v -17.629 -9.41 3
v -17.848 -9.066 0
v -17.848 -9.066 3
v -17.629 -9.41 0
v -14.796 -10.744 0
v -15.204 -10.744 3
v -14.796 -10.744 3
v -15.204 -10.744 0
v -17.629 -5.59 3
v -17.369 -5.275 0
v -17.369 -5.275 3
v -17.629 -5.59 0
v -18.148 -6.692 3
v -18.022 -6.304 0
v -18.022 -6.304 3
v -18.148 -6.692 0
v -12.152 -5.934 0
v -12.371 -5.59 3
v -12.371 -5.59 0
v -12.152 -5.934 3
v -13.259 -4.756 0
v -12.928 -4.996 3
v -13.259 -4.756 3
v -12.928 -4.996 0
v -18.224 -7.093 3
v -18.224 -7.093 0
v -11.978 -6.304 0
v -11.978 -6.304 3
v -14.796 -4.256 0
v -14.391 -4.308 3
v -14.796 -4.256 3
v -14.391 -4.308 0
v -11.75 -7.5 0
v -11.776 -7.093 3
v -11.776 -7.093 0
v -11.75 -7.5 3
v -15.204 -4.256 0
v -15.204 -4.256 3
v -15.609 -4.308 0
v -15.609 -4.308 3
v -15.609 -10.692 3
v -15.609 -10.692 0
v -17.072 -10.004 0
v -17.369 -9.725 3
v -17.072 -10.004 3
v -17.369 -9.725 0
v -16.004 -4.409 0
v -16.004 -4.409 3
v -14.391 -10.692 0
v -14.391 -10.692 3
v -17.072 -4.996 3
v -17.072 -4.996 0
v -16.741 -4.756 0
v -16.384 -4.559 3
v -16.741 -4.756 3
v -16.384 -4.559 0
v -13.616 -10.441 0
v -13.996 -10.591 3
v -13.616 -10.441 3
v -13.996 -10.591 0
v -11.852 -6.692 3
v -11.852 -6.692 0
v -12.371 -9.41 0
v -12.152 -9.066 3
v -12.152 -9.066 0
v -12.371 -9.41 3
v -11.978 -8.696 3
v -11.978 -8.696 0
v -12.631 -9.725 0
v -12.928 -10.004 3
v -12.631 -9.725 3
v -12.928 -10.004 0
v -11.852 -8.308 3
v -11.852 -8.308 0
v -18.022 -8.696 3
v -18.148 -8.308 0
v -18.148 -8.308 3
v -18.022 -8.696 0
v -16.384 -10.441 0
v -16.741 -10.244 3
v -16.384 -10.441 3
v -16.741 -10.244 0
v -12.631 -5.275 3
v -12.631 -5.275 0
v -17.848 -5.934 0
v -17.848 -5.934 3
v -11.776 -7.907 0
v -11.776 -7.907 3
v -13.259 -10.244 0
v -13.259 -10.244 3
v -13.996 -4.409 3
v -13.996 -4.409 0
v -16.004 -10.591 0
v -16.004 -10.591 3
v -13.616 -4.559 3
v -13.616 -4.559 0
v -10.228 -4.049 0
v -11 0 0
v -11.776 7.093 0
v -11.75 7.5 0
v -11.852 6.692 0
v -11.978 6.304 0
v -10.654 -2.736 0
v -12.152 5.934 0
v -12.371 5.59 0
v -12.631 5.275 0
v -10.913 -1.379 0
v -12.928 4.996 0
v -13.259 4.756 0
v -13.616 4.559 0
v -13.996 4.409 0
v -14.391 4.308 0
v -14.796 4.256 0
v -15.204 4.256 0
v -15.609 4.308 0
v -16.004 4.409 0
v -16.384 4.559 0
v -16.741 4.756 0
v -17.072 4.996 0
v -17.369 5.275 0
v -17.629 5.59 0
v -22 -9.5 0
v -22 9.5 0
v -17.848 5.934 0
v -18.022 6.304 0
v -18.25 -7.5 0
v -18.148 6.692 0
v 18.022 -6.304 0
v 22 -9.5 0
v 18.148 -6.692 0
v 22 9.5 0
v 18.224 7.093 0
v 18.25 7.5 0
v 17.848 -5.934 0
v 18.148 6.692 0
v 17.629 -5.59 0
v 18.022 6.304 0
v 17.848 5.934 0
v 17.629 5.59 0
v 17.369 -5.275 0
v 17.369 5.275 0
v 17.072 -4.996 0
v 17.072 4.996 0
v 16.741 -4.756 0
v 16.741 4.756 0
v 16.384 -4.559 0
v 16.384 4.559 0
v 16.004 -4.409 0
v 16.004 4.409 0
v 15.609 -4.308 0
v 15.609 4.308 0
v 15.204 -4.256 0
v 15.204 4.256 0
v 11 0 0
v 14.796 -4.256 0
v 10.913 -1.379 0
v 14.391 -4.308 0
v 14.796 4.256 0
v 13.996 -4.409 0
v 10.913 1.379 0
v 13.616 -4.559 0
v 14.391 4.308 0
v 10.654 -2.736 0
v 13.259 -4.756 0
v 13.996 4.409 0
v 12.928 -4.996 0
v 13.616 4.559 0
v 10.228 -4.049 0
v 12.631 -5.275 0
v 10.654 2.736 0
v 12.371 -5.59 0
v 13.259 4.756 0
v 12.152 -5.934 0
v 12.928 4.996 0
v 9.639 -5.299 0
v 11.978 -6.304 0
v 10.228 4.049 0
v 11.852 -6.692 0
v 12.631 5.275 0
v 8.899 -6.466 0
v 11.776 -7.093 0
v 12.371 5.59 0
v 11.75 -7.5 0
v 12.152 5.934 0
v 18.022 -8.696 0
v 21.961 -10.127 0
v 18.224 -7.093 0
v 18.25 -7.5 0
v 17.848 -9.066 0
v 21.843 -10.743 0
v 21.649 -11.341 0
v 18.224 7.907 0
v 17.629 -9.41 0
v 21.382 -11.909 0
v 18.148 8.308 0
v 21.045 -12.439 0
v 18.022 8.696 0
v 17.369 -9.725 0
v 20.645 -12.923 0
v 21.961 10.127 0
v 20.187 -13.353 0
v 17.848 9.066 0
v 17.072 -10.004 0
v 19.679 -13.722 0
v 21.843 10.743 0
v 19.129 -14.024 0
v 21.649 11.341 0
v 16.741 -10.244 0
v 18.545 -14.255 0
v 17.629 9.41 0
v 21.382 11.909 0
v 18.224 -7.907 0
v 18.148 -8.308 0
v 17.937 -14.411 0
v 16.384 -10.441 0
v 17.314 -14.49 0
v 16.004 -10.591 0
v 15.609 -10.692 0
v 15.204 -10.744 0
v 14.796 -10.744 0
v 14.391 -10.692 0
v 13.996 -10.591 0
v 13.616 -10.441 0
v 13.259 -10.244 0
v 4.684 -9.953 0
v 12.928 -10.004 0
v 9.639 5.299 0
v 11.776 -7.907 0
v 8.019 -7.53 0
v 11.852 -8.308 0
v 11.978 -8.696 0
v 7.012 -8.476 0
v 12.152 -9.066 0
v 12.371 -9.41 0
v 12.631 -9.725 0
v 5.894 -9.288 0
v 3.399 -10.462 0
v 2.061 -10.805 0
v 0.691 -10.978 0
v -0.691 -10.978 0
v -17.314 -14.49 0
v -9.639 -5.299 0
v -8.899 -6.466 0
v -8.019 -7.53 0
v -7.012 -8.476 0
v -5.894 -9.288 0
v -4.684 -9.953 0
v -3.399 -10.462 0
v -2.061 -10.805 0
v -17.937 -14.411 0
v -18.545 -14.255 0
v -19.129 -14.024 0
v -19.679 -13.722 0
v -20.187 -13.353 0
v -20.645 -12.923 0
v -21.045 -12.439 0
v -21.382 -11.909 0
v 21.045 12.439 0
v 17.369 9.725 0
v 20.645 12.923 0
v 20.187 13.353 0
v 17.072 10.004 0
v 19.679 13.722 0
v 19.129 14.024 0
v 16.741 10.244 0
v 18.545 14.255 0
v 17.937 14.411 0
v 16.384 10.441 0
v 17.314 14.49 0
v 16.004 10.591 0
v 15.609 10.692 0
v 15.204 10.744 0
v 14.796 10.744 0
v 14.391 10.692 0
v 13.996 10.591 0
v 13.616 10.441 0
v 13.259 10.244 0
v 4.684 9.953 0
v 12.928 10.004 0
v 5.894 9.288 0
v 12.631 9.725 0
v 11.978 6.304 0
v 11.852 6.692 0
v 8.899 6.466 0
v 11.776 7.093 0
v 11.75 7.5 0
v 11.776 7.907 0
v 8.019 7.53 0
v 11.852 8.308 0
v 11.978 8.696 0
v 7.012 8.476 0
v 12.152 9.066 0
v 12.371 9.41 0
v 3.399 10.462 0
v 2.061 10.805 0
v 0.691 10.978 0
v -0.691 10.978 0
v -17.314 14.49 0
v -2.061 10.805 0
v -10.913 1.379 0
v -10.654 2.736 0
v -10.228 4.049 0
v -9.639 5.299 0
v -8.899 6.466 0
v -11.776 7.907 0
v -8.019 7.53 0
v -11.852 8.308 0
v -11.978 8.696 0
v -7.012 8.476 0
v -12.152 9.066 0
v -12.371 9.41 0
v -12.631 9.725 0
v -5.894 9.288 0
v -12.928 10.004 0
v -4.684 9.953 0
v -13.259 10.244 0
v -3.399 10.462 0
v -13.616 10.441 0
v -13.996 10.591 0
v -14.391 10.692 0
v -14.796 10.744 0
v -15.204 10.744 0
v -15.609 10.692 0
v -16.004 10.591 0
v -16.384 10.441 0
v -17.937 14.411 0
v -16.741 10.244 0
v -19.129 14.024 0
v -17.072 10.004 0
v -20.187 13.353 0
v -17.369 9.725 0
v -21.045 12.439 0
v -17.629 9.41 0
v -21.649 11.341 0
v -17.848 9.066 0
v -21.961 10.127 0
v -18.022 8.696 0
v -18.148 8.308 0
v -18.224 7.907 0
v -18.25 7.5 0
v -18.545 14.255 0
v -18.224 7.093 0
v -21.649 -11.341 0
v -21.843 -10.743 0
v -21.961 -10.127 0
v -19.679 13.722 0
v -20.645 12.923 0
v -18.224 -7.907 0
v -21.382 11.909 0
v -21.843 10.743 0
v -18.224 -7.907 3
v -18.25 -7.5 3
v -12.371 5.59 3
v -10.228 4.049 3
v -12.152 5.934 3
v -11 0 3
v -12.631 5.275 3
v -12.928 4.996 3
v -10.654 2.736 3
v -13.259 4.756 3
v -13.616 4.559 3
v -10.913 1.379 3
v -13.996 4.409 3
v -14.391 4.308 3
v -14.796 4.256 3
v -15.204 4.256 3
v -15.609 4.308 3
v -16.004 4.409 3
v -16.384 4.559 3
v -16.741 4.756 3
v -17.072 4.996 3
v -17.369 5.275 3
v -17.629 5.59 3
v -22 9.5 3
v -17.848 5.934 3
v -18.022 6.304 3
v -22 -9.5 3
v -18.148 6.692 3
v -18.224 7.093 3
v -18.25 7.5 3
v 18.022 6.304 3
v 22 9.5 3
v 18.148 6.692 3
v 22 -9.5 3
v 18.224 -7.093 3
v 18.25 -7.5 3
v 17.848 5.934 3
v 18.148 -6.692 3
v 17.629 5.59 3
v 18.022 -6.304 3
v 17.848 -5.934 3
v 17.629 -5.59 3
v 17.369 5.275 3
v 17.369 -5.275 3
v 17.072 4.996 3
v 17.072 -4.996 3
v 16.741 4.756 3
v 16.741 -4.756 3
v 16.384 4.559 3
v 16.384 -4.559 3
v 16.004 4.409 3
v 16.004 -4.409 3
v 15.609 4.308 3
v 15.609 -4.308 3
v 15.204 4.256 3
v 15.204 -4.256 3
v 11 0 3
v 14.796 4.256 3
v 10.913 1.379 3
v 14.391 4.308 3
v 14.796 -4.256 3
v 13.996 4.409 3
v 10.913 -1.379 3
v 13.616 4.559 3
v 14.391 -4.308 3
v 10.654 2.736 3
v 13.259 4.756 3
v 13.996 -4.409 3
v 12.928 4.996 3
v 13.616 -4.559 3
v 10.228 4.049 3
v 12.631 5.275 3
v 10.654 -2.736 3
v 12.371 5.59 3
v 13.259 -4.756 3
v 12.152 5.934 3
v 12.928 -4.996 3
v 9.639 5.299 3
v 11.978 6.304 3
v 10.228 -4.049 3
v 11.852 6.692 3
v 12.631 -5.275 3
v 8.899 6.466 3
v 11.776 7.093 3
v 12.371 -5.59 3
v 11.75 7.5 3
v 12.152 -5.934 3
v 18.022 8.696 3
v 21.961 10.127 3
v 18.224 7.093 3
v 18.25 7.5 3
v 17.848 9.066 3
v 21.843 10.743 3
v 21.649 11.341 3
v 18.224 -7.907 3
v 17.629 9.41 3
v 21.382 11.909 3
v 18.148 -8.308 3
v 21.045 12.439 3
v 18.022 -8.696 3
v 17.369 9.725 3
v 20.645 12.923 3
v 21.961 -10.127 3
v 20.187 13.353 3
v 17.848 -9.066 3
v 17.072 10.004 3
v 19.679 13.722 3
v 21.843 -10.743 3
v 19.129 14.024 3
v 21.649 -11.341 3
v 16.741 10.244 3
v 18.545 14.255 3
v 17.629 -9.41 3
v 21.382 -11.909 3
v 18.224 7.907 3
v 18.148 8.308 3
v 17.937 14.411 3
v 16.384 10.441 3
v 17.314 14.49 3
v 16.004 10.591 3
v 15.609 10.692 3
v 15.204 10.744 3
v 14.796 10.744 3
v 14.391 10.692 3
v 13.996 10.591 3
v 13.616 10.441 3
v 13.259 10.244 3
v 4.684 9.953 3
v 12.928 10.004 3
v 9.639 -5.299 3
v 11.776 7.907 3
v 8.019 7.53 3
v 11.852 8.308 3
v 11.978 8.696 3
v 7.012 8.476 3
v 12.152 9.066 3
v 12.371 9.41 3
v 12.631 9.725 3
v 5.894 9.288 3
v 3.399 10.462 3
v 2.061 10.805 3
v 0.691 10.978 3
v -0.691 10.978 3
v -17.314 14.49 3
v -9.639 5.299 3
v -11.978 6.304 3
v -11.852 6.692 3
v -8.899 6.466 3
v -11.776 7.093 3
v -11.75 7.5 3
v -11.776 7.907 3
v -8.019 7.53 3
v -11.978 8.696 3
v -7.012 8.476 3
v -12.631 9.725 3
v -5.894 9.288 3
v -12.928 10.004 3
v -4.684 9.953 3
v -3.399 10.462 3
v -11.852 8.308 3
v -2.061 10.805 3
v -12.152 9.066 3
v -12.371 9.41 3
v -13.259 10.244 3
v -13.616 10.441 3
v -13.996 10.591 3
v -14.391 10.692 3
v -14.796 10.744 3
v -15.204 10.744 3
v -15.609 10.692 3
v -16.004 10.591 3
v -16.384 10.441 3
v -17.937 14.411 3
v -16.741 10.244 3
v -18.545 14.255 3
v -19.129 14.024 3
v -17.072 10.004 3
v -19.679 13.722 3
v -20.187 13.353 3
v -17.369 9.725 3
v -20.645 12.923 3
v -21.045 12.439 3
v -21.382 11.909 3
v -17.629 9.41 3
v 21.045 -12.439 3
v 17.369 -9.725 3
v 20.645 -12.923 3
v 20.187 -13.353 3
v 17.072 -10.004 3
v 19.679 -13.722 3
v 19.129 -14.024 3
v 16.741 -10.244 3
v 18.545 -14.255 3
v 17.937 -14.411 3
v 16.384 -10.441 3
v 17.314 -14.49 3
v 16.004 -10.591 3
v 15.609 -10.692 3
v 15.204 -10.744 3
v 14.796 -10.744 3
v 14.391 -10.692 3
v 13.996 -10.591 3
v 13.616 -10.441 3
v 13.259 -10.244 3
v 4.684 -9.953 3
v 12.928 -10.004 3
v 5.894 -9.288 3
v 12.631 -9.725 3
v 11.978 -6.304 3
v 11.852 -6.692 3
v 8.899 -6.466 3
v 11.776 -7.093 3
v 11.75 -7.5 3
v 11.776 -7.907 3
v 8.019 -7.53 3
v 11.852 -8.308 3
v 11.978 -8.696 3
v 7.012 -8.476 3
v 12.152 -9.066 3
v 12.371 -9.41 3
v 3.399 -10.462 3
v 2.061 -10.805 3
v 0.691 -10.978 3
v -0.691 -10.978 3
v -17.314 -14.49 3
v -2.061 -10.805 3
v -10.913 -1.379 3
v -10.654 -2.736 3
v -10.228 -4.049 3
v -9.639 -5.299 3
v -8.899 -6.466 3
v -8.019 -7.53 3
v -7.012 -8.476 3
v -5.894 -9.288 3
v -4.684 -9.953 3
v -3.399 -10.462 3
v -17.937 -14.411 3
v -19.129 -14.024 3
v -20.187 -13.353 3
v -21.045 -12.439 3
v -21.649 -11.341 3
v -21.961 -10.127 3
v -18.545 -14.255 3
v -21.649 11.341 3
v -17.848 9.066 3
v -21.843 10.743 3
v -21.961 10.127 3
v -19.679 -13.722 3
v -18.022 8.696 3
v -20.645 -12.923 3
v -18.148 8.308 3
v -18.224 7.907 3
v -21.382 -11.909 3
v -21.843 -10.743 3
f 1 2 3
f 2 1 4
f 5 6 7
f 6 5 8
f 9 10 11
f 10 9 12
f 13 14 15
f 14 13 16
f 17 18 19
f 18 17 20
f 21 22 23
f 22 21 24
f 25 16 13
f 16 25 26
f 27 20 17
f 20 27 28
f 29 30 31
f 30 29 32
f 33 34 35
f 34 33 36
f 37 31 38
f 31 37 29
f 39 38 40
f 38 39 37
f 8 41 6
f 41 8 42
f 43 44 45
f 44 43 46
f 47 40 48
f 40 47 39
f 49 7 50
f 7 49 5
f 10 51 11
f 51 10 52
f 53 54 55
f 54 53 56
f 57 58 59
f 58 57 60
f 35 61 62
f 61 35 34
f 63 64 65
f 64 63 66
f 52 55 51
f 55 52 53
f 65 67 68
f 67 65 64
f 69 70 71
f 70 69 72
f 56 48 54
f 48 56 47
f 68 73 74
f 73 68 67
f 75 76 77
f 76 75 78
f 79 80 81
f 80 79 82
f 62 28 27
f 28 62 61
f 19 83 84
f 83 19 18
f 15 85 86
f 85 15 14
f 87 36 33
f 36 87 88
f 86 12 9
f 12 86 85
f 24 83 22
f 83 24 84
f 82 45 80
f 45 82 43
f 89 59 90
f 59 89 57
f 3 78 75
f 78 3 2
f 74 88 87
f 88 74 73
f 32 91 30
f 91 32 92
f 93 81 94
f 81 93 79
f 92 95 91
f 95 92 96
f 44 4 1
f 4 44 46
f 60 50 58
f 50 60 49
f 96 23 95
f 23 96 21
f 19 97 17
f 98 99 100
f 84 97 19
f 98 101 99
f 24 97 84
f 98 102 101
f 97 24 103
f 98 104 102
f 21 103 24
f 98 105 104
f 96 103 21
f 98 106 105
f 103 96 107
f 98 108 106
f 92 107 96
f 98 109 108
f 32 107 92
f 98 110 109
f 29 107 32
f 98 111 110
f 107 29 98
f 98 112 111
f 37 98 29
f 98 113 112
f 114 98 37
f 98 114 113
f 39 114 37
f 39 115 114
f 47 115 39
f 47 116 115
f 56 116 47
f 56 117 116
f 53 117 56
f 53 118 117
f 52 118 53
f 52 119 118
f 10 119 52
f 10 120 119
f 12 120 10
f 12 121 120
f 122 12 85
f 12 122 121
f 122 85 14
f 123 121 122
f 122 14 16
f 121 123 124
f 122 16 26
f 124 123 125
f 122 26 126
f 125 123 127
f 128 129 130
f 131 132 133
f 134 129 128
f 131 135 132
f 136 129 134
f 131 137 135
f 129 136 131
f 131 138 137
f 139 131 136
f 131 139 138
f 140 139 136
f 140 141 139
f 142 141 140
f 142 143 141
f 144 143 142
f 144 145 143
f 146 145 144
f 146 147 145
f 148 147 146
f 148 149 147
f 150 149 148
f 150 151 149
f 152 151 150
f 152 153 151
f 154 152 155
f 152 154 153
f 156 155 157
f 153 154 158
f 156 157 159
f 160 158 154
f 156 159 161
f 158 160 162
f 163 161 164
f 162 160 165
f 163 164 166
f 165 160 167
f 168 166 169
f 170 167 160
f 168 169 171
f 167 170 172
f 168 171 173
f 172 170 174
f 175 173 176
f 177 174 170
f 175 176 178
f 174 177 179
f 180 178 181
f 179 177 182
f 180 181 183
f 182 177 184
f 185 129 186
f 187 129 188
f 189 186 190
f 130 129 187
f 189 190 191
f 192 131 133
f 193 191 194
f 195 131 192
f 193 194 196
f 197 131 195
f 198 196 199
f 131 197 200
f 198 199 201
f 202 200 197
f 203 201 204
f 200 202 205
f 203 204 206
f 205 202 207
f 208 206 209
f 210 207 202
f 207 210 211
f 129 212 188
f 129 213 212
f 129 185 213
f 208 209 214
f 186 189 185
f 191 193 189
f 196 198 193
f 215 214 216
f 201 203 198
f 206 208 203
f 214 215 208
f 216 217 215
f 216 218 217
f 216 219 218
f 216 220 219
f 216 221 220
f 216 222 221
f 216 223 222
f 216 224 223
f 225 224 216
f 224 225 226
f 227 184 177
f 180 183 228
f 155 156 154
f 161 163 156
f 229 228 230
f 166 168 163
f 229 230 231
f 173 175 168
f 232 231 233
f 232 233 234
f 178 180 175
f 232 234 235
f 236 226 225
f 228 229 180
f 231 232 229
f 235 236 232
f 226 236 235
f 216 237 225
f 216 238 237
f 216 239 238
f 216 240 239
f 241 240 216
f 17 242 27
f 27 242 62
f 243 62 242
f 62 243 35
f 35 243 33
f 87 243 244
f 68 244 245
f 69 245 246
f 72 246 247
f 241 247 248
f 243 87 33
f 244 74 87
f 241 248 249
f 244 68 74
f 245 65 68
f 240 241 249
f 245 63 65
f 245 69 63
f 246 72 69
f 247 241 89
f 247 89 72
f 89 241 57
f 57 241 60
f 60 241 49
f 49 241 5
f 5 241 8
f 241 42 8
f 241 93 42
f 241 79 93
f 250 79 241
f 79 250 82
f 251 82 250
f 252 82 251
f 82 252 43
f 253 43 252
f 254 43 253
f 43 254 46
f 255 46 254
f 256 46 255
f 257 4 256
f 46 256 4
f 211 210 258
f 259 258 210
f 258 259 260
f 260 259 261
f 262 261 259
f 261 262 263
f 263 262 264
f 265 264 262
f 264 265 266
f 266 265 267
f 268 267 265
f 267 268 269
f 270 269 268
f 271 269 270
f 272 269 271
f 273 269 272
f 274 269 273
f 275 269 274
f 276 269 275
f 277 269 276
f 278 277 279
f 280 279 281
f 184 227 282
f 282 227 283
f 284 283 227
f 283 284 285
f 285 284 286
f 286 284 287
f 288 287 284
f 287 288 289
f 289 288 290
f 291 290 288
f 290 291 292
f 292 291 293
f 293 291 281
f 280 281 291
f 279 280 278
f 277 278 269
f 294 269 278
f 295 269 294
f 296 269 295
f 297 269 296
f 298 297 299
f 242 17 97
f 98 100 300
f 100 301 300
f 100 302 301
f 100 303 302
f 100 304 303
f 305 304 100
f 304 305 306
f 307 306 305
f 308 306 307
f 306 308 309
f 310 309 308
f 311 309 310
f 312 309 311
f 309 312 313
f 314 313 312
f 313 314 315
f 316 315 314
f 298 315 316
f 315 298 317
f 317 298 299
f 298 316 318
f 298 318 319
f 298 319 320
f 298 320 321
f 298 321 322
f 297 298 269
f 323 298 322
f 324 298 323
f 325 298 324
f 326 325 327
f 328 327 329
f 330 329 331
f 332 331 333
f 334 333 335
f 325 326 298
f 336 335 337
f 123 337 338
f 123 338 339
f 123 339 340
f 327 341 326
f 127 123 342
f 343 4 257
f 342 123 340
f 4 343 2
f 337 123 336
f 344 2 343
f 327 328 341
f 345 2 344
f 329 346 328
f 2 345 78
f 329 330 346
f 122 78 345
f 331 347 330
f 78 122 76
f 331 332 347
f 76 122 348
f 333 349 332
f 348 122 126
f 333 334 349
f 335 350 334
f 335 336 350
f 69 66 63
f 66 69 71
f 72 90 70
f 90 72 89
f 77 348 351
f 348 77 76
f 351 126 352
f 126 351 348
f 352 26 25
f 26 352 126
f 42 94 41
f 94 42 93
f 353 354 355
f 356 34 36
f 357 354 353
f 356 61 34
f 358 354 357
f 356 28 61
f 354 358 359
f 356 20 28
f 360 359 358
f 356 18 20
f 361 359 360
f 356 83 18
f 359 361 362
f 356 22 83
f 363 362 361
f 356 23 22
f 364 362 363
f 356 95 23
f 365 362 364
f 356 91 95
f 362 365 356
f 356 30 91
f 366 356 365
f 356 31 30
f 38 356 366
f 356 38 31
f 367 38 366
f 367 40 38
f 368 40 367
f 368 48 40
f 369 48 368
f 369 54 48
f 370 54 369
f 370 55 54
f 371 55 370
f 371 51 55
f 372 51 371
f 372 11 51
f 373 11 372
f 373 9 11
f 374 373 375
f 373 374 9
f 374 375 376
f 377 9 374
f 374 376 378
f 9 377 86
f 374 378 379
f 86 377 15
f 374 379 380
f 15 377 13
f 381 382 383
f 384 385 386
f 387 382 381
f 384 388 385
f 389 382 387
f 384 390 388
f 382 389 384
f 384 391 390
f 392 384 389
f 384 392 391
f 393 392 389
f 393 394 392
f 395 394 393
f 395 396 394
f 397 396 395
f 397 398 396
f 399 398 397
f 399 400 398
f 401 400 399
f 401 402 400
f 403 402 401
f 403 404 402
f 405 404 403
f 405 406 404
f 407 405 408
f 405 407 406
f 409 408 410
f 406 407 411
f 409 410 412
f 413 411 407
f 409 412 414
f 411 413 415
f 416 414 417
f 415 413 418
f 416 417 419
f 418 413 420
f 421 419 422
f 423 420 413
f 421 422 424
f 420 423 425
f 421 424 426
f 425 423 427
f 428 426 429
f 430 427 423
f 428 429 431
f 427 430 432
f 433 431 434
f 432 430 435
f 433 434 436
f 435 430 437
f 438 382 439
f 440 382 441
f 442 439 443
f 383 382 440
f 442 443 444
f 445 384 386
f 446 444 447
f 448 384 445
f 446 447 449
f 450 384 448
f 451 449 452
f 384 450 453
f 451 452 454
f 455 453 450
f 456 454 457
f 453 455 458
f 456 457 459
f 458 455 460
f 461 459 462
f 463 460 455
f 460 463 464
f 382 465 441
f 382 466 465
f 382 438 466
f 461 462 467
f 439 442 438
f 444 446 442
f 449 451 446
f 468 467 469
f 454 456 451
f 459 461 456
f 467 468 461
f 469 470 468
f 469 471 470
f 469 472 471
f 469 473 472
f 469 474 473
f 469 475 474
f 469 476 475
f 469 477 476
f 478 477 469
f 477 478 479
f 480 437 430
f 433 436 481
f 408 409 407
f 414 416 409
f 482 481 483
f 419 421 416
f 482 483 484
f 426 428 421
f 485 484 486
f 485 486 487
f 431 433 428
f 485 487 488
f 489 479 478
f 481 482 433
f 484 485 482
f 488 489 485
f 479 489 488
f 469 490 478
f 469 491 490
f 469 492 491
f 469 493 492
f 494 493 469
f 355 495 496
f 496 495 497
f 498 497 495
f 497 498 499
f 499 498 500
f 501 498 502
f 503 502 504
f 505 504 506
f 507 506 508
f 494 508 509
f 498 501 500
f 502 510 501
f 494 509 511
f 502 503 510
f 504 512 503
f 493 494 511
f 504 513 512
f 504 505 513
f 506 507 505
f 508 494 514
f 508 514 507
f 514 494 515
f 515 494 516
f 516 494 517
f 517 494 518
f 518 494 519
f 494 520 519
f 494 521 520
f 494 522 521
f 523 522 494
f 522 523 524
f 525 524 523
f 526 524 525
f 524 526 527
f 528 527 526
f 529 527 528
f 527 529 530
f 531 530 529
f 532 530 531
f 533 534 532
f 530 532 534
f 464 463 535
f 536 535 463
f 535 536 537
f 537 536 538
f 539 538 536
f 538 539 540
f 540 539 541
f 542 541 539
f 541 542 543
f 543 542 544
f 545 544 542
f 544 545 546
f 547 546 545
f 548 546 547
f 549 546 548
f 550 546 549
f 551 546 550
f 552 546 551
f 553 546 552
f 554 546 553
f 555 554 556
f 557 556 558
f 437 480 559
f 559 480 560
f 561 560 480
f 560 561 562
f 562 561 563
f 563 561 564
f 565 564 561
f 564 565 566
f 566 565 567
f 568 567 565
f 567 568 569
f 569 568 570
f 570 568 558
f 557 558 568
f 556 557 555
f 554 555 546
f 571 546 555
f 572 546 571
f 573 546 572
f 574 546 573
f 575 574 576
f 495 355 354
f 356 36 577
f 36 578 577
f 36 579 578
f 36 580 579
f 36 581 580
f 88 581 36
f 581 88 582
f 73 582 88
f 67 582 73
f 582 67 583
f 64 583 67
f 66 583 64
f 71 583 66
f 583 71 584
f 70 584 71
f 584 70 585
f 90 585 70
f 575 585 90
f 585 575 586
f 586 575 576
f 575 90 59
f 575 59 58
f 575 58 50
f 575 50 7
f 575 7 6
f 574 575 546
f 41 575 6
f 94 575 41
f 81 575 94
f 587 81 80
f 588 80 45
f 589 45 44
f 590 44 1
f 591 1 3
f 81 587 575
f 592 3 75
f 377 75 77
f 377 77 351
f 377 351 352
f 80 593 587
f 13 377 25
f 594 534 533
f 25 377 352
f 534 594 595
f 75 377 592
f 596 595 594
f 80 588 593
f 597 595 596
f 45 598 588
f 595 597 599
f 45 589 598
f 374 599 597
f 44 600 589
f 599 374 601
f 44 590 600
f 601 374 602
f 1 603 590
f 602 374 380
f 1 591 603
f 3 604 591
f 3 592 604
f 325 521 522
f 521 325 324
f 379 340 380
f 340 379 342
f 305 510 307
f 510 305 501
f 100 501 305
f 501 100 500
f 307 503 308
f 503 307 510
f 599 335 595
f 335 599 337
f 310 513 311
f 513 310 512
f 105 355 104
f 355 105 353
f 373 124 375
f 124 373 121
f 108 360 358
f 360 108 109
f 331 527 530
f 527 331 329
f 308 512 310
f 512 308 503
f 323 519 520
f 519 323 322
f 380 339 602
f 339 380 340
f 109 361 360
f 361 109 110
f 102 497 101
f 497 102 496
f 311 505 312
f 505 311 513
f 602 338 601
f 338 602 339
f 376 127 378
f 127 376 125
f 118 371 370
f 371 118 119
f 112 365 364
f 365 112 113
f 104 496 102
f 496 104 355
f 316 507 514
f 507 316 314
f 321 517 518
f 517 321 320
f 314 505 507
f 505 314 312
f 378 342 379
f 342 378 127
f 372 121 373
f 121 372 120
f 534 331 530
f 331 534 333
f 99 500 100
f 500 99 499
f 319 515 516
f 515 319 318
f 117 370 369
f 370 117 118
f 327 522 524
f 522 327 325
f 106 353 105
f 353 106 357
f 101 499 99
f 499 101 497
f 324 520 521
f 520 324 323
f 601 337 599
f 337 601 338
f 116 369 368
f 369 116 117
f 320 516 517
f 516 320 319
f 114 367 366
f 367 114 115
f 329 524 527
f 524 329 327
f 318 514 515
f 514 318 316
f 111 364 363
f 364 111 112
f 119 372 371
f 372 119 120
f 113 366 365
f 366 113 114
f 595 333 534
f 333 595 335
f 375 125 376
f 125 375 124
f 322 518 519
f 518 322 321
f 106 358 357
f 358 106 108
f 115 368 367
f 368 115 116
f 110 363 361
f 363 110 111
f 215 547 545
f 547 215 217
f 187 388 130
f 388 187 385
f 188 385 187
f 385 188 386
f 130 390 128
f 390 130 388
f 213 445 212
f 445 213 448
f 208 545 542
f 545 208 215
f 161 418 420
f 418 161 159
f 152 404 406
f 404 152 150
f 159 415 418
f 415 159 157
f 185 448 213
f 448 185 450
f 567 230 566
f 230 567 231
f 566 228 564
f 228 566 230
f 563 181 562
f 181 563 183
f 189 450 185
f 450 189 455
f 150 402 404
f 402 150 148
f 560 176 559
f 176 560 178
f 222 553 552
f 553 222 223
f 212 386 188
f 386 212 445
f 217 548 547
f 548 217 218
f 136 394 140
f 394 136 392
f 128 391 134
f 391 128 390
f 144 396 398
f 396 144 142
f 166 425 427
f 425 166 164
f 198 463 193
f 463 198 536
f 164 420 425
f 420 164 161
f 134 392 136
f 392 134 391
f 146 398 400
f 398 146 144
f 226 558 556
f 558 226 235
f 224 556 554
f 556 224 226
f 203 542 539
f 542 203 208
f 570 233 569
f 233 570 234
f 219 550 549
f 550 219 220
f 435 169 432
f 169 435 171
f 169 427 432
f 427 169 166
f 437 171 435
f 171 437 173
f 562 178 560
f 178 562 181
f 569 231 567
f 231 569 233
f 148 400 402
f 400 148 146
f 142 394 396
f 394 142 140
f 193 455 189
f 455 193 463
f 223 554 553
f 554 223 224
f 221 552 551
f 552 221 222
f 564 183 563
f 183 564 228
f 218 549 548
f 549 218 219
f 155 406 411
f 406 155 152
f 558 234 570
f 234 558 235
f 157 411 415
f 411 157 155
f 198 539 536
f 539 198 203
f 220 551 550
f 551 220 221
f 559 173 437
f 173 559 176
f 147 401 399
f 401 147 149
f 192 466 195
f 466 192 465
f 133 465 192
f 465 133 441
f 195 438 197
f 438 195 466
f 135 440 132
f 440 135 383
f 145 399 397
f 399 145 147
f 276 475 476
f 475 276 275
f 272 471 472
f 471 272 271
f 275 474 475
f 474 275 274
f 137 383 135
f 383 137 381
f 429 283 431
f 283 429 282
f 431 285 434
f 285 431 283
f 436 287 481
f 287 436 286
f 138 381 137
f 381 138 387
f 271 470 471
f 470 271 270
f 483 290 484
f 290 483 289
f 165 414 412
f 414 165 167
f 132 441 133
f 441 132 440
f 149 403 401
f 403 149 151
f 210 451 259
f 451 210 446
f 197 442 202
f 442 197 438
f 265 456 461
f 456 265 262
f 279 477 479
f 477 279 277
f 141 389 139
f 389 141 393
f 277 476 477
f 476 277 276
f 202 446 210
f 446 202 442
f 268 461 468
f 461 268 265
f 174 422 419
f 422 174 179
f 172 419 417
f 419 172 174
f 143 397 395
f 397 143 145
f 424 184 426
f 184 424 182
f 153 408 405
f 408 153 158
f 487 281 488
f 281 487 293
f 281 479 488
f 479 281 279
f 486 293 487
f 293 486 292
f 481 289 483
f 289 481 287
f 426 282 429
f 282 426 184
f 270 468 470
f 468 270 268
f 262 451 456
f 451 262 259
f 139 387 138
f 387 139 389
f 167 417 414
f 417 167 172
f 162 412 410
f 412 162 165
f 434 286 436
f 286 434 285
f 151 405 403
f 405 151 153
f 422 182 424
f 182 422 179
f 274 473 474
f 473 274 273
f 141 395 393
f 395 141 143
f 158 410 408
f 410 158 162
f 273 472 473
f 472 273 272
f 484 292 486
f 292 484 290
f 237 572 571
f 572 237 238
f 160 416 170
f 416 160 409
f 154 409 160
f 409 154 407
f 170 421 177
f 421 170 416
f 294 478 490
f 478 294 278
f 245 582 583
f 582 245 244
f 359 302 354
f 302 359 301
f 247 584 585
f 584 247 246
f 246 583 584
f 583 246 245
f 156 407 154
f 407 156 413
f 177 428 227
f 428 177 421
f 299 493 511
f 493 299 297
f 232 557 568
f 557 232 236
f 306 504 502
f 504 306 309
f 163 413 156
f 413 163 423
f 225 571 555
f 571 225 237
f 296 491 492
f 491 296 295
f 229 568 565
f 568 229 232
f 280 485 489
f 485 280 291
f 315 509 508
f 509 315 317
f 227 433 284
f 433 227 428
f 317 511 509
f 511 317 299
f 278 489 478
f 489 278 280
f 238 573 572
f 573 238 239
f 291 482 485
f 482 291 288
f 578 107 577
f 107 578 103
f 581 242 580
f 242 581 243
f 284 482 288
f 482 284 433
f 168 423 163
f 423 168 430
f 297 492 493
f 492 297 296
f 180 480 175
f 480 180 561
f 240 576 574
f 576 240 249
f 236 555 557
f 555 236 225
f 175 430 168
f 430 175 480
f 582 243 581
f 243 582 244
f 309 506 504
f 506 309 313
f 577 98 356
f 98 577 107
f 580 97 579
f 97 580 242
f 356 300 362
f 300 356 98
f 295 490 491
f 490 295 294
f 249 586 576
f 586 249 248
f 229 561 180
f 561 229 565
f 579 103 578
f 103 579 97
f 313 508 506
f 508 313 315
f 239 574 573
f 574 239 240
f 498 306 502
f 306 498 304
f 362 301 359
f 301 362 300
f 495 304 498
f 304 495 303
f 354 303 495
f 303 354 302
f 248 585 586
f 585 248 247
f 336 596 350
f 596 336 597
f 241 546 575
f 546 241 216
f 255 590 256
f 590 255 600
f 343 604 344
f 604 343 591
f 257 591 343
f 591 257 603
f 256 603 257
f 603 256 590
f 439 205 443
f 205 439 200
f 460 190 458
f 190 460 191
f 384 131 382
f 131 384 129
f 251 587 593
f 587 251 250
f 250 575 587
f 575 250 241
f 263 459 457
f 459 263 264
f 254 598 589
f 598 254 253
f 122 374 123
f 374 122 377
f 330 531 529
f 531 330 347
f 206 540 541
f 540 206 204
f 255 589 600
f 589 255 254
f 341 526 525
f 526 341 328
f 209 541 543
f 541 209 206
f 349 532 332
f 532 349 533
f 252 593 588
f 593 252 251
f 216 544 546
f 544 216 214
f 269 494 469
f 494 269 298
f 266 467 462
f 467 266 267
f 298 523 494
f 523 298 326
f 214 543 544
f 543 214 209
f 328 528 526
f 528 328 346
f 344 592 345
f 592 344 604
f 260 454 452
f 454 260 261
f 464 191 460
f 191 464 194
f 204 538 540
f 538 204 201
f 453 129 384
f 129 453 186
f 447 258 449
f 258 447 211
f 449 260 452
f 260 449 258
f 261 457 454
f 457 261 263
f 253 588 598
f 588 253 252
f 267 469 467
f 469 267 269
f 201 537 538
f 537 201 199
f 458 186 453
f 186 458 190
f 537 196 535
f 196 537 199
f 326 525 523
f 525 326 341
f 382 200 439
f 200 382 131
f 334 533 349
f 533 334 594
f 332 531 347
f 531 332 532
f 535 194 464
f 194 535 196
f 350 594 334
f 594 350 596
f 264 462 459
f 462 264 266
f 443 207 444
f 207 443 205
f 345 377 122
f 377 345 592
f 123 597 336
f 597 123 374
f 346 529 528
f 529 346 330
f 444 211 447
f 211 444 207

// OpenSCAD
$fn = 50;

difference() {
	union() {
		hull() {
			translate(v = [-17.0, 9.5, 0]) {
				cylinder(h = 3, r = 5);
			}
			translate(v = [17.0, 9.5, 0]) {
				cylinder(h = 3, r = 5);
			}
			translate(v = [-17.0, -9.5, 0]) {
				cylinder(h = 3, r = 5);
			}
			translate(v = [17.0, -9.5, 0]) {
				cylinder(h = 3, r = 5);
			}
		}
	}
	union() {
		translate(v = [-15.0, -7.5, 0]) {
			cylinder(h = 3, r = 3.25);
		}
		translate(v = [-15.0, 7.5, 0]) {
			cylinder(h = 3, r = 3.25);
		}
		translate(v = [15.0, -7.5, 0]) {
			cylinder(h = 3, r = 3.25);
		}
		translate(v = [15.0, 7.5, 0]) {
			cylinder(h = 3, r = 3.25);
		}
		cylinder(h = 3, r = 11.0);
	}
}
